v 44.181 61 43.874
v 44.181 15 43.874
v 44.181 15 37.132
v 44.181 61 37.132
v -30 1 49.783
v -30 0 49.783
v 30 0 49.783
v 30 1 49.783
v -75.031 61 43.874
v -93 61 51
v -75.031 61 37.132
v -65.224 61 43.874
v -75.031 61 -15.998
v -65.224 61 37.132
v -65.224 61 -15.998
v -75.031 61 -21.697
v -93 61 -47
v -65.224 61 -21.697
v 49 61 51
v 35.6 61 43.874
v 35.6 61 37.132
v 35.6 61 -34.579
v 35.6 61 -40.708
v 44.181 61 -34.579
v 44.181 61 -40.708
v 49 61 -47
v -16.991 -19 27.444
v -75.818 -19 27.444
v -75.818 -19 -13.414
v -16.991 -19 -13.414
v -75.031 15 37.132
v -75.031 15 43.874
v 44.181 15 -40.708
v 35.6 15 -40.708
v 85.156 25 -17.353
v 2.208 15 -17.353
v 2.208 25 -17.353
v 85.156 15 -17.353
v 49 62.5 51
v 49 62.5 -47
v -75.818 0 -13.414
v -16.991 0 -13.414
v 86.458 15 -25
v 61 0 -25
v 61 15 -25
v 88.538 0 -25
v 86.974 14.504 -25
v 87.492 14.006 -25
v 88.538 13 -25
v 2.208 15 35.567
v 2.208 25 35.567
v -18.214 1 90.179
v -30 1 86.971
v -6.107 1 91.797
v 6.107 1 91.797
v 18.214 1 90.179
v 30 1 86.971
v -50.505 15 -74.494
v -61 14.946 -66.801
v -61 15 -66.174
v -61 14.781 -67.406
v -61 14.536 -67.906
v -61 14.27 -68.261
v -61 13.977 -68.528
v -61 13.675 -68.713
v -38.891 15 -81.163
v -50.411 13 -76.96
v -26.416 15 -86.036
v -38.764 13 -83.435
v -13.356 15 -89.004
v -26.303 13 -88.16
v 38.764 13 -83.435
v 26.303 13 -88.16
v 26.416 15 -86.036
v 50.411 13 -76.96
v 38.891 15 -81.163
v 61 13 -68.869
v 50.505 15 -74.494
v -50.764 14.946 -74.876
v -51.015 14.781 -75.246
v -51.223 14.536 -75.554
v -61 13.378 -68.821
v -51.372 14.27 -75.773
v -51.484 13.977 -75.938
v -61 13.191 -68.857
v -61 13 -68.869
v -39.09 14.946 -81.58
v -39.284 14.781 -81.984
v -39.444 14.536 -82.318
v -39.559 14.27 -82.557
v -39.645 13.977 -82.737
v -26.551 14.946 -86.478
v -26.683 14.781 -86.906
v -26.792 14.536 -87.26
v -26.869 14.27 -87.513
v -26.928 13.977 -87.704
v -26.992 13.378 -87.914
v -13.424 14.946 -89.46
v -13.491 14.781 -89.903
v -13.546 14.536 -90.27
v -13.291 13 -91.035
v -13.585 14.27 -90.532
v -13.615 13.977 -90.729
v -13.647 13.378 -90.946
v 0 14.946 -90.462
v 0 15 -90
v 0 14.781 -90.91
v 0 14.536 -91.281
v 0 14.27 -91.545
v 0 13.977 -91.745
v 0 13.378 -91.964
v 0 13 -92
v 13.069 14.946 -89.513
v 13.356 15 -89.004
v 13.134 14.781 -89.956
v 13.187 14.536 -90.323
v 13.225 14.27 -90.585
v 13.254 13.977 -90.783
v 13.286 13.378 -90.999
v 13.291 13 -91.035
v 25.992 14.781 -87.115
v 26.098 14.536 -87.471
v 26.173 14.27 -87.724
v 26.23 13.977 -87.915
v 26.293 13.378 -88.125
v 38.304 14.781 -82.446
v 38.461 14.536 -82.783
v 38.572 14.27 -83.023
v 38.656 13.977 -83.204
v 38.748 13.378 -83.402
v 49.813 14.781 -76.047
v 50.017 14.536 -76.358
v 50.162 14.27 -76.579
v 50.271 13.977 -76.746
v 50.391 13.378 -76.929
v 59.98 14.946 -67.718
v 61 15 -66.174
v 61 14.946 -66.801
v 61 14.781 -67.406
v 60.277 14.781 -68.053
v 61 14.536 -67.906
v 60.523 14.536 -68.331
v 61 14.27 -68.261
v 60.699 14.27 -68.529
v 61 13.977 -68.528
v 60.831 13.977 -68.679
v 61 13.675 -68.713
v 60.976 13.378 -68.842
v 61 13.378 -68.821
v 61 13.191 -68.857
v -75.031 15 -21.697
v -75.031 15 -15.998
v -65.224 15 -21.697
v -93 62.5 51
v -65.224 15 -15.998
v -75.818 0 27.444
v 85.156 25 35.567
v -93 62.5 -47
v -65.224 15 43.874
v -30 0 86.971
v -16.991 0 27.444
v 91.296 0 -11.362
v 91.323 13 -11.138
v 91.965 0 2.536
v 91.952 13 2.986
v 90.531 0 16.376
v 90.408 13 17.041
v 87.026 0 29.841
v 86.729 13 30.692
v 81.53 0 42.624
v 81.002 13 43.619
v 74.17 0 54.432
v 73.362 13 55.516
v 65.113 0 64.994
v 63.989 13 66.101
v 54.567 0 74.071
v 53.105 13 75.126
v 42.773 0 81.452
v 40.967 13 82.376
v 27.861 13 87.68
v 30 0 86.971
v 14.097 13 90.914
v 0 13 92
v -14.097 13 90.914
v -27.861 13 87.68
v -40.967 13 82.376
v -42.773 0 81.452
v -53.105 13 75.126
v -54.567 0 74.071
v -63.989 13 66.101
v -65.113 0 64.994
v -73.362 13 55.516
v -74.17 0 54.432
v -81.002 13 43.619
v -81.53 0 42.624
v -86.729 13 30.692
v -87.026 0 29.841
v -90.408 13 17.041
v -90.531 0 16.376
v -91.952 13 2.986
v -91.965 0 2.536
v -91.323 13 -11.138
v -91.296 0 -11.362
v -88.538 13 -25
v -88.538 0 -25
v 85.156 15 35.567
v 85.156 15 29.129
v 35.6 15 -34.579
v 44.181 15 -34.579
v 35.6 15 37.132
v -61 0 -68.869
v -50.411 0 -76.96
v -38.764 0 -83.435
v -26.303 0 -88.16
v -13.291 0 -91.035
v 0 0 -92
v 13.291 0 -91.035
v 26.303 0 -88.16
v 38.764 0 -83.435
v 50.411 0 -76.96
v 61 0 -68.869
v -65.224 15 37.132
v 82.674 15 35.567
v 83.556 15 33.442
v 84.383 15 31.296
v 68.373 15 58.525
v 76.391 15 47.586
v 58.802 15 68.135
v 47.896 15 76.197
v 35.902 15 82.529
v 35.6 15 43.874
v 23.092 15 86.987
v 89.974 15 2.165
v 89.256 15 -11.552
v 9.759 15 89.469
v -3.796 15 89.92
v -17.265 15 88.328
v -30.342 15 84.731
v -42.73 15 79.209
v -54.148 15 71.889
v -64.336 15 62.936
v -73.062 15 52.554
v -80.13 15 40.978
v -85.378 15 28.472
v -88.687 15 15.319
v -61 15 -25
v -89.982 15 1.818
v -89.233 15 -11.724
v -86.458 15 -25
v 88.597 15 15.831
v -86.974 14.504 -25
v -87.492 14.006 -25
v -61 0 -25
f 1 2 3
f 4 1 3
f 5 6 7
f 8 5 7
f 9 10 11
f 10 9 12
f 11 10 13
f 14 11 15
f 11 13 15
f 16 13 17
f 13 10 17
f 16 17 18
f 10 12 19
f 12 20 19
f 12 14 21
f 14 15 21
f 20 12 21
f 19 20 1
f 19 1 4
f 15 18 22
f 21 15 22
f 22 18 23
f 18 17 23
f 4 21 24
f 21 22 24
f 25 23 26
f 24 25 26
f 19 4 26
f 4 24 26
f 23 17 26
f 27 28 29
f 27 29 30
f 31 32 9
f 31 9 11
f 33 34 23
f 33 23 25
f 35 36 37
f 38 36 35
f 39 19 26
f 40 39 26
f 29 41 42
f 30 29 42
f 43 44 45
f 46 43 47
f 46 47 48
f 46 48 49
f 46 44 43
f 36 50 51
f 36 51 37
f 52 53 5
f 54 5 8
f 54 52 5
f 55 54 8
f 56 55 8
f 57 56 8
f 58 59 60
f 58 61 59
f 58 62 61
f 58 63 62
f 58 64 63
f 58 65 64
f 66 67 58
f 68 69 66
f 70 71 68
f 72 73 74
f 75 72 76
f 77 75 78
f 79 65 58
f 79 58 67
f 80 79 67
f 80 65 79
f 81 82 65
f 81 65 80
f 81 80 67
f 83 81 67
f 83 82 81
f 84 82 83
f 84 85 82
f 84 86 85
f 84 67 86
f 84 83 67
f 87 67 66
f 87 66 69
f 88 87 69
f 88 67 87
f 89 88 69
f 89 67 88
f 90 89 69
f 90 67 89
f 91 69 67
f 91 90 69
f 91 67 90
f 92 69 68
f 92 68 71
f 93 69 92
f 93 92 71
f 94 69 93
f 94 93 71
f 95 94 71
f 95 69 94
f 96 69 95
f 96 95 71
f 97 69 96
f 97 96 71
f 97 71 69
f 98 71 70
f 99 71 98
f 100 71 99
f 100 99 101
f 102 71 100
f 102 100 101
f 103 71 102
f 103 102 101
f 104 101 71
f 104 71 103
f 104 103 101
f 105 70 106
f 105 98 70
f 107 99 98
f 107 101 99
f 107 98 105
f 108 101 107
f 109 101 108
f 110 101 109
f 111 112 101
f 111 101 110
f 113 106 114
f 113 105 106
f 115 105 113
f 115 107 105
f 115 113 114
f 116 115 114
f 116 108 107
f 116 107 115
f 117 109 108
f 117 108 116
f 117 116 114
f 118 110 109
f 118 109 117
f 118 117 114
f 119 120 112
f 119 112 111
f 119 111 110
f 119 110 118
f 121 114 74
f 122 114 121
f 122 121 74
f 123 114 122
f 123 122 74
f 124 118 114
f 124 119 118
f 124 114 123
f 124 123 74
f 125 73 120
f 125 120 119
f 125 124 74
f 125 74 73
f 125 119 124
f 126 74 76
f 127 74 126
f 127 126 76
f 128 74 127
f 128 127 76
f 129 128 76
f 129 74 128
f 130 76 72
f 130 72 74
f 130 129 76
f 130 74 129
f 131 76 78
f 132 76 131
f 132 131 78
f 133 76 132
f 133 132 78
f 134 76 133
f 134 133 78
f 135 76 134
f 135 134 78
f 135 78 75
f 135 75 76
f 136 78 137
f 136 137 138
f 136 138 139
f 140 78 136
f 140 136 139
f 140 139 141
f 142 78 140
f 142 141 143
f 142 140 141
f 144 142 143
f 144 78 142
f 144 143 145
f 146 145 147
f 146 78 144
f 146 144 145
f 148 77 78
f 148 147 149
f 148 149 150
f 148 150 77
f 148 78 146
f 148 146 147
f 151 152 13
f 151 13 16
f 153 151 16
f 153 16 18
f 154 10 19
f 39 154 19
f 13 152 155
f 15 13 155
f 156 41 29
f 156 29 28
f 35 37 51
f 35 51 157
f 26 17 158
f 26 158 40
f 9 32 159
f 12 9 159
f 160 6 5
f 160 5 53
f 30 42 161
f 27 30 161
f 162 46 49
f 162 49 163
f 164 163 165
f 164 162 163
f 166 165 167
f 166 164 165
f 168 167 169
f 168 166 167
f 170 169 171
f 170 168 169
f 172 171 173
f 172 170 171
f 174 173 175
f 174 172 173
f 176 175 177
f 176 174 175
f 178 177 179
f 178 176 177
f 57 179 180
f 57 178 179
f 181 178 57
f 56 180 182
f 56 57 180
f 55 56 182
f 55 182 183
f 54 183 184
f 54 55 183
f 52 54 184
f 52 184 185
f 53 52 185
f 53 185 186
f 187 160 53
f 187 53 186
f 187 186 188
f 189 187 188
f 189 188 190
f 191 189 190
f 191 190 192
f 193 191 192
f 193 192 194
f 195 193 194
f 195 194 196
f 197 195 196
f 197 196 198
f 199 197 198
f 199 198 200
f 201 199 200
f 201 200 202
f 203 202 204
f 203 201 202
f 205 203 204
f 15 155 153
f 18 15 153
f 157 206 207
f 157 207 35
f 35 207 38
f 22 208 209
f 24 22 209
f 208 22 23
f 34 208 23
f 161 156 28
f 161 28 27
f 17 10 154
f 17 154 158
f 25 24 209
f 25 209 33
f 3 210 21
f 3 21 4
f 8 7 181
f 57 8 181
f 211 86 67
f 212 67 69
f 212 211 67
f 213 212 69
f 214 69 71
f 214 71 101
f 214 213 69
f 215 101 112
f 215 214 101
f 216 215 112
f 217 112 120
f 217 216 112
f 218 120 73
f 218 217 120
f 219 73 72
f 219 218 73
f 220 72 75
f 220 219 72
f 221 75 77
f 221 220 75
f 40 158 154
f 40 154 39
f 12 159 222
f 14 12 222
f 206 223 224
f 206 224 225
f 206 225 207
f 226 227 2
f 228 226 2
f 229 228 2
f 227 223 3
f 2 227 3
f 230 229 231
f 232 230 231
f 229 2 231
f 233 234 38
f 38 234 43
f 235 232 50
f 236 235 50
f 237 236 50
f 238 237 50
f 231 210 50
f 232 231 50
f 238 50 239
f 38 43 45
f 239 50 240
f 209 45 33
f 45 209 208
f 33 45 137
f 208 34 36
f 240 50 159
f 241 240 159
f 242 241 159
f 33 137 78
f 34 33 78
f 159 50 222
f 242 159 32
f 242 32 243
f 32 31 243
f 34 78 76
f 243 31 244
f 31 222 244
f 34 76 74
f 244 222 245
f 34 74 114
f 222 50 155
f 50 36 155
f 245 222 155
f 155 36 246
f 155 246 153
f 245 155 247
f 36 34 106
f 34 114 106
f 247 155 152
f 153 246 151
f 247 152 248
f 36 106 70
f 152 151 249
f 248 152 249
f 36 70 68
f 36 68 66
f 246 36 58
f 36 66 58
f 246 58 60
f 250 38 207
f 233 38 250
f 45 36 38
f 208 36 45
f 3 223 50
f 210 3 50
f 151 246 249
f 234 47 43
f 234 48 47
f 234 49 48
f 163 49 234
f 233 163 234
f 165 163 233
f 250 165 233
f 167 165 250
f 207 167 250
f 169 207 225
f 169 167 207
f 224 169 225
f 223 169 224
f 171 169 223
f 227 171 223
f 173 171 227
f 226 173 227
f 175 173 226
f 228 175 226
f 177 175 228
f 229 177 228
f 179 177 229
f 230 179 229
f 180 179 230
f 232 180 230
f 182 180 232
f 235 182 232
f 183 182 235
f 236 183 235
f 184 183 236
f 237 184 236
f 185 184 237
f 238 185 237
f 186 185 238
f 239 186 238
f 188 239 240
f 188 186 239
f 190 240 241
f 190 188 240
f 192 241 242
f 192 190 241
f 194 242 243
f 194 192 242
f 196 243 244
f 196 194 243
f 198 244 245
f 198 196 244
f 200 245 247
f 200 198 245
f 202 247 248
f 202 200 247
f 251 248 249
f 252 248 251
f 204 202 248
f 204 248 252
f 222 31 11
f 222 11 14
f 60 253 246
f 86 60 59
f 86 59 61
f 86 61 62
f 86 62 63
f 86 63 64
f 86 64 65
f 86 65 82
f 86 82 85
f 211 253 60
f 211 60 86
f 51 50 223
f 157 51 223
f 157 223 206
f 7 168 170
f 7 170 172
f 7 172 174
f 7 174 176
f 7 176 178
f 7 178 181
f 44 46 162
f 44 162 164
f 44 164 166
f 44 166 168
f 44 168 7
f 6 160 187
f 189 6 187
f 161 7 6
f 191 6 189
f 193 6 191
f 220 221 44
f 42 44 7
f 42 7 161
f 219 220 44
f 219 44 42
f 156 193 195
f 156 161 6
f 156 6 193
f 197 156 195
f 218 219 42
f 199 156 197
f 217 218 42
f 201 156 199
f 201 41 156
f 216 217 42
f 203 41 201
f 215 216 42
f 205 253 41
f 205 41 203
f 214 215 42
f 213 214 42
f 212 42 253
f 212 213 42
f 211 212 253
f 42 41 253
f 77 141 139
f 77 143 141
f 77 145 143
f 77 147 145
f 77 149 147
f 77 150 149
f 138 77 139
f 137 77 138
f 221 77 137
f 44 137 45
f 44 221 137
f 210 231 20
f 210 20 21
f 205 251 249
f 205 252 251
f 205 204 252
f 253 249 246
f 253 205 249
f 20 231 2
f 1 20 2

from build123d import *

# Parameters (mm, degrees)
EXTRUDE_1_DEPTH     = 15
SKETCH_2_W          = 60
SKETCH_2_H          = 43
CUT_EXTRUDE_1_DEPTH = 1
EXTRUDE_START       = 46
SKETCH_3_W          = 142
SKETCH_3_H          = 98
EXTRUDE_2_DEPTH     = 1.5
EXTRUDE_3_REACH     = 141.173
SKETCH_4_W          = 8.580803558
SKETCH_4_H          = 6.129145399
SKETCH_4_H_2        = 6.742059939
SKETCH_4_W_2        = 9.806632637
SKETCH_4_H_3        = 5.698922344
CHAMFER_1_SIZE      = 2
FILLET_1_R          = 2
SKETCH_5_W          = 58.826750964
SKETCH_5_H          = 40.858747532
EXTRUDE_4_DEPTH     = 19
SKETCH_6_W          = 82.94818023
SKETCH_6_H          = 52.919462164
EXTRUDE_5_DEPTH     = 10


with BuildPart() as part:
    # 草图1 → 凸台-拉伸1 (new body)
    with BuildSketch(Plane(origin=(0, 0, 0), x_dir=(1, 0, 0), z_dir=(0, 1, 0))):
        with BuildLine():
            Line((61, 68.869441699), (61, 25))
            Line((61, 25), (88.53812738, 25))
            ThreePointArc((88.53812738, 25), (0, -92), (-88.53812738, 25))
            Line((-88.53812738, 25), (-61, 25))
            Line((-61, 25), (-61, 68.869441699))
            ThreePointArc((-61, 68.869441699), (0, 92), (61, 68.869441699))
        make_face()
    extrude(amount=EXTRUDE_1_DEPTH)

    # 草图2 → 切除-拉伸1 (cut)
    with BuildSketch(Plane.XZ):
        with Locations((0, 71.283217175)):
            Rectangle(SKETCH_2_W, SKETCH_2_H)
    extrude(amount=-CUT_EXTRUDE_1_DEPTH, mode=Mode.SUBTRACT)


with BuildPart() as body_2:
    # 草图3 → 凸台-拉伸2 (new body)
    with BuildSketch(Plane(origin=(0, 15, 0), x_dir=(1, 0, 0), z_dir=(0, 1, 0)).offset(EXTRUDE_START)):
        with Locations((-22, -2)):
            Rectangle(SKETCH_3_W, SKETCH_3_H)
    extrude(amount=EXTRUDE_2_DEPTH)

    # 草图4 → 凸台-拉伸3 (add, up to next)
    with BuildSketch(Plane(origin=(0, 15, 0), x_dir=(1, 0, 0), z_dir=(0, 1, 0)), mode=Mode.PRIVATE) as extrude_3_sk1:
        with Locations((39.89053511, 37.643718522)):
            Rectangle(SKETCH_4_W, SKETCH_4_H)
    extrude_3_tool1 = extrude(extrude_3_sk1.sketch, amount=EXTRUDE_3_REACH, mode=Mode.PRIVATE) - body_2.part
    # 草图4 → 凸台-拉伸3 (add, up to next)
    with BuildSketch(Plane(origin=(0, 15, 0), x_dir=(1, 0, 0), z_dir=(0, 1, 0)), mode=Mode.PRIVATE) as extrude_3_sk2:
        with Locations((39.89053511, -40.502885308)):
            Rectangle(SKETCH_4_W, SKETCH_4_H_2)
    extrude_3_tool2 = extrude(extrude_3_sk2.sketch, amount=EXTRUDE_3_REACH, mode=Mode.PRIVATE) - body_2.part
    # 草图4 → 凸台-拉伸3 (add, up to next)
    with BuildSketch(Plane(origin=(0, 15, 0), x_dir=(1, 0, 0), z_dir=(0, 1, 0)), mode=Mode.PRIVATE) as extrude_3_sk3:
        with Locations((-70.127624791, -40.502885308)):
            Rectangle(SKETCH_4_W_2, SKETCH_4_H_2)
    extrude_3_tool3 = extrude(extrude_3_sk3.sketch, amount=EXTRUDE_3_REACH, mode=Mode.PRIVATE) - body_2.part
    # 草图4 → 凸台-拉伸3 (add, up to next)
    with BuildSketch(Plane(origin=(0, 15, 0), x_dir=(1, 0, 0), z_dir=(0, 1, 0)), mode=Mode.PRIVATE) as extrude_3_sk4:
        with Locations((-70.127624791, 18.84767654)):
            Rectangle(SKETCH_4_W_2, SKETCH_4_H_3)
    extrude_3_tool4 = extrude(extrude_3_sk4.sketch, amount=EXTRUDE_3_REACH, mode=Mode.PRIVATE) - body_2.part

    add(part.part)  # 凸台-拉伸3 merges part
    add(extrude_3_tool1.solids().sort_by_distance((39.890535, 15, -37.643719))[0])
    add(extrude_3_tool2.solids().sort_by_distance((39.890535, 15, 40.502885))[0])
    add(extrude_3_tool3.solids().sort_by_distance((-70.127625, 15, 40.502885))[0])
    add(extrude_3_tool4.solids().sort_by_distance((-70.127625, 15, -18.847677))[0])

    # 倒角1
    chamfer_1_edges = [body_2.edges().sort_by_distance(p)[0] for p in [
        (0, 15, 92),
    ]]
    chamfer(chamfer_1_edges, length=CHAMFER_1_SIZE)

    # 圆角1
    fillet_1_edges = [body_2.edges().sort_by_distance(p)[0] for p in [
        (0, 15, -92),
    ]]
    fillet(fillet_1_edges, radius=FILLET_1_R)

    # 草图5 → 凸台-拉伸4 (add)
    with BuildSketch(Plane.XZ):
        with Locations((-46.404556715, 7.01490545)):
            Rectangle(SKETCH_5_W, SKETCH_5_H)
    extrude(amount=EXTRUDE_4_DEPTH)

    # 草图6 → 凸台-拉伸5 (add)
    with BuildSketch(Plane(origin=(0, 15, 0), x_dir=(1, 0, 0), z_dir=(0, 1, 0))):
        with Locations((43.681597482, -9.107070233)):
            Rectangle(SKETCH_6_W, SKETCH_6_H)
    extrude(amount=EXTRUDE_5_DEPTH)


solid = body_2.part
